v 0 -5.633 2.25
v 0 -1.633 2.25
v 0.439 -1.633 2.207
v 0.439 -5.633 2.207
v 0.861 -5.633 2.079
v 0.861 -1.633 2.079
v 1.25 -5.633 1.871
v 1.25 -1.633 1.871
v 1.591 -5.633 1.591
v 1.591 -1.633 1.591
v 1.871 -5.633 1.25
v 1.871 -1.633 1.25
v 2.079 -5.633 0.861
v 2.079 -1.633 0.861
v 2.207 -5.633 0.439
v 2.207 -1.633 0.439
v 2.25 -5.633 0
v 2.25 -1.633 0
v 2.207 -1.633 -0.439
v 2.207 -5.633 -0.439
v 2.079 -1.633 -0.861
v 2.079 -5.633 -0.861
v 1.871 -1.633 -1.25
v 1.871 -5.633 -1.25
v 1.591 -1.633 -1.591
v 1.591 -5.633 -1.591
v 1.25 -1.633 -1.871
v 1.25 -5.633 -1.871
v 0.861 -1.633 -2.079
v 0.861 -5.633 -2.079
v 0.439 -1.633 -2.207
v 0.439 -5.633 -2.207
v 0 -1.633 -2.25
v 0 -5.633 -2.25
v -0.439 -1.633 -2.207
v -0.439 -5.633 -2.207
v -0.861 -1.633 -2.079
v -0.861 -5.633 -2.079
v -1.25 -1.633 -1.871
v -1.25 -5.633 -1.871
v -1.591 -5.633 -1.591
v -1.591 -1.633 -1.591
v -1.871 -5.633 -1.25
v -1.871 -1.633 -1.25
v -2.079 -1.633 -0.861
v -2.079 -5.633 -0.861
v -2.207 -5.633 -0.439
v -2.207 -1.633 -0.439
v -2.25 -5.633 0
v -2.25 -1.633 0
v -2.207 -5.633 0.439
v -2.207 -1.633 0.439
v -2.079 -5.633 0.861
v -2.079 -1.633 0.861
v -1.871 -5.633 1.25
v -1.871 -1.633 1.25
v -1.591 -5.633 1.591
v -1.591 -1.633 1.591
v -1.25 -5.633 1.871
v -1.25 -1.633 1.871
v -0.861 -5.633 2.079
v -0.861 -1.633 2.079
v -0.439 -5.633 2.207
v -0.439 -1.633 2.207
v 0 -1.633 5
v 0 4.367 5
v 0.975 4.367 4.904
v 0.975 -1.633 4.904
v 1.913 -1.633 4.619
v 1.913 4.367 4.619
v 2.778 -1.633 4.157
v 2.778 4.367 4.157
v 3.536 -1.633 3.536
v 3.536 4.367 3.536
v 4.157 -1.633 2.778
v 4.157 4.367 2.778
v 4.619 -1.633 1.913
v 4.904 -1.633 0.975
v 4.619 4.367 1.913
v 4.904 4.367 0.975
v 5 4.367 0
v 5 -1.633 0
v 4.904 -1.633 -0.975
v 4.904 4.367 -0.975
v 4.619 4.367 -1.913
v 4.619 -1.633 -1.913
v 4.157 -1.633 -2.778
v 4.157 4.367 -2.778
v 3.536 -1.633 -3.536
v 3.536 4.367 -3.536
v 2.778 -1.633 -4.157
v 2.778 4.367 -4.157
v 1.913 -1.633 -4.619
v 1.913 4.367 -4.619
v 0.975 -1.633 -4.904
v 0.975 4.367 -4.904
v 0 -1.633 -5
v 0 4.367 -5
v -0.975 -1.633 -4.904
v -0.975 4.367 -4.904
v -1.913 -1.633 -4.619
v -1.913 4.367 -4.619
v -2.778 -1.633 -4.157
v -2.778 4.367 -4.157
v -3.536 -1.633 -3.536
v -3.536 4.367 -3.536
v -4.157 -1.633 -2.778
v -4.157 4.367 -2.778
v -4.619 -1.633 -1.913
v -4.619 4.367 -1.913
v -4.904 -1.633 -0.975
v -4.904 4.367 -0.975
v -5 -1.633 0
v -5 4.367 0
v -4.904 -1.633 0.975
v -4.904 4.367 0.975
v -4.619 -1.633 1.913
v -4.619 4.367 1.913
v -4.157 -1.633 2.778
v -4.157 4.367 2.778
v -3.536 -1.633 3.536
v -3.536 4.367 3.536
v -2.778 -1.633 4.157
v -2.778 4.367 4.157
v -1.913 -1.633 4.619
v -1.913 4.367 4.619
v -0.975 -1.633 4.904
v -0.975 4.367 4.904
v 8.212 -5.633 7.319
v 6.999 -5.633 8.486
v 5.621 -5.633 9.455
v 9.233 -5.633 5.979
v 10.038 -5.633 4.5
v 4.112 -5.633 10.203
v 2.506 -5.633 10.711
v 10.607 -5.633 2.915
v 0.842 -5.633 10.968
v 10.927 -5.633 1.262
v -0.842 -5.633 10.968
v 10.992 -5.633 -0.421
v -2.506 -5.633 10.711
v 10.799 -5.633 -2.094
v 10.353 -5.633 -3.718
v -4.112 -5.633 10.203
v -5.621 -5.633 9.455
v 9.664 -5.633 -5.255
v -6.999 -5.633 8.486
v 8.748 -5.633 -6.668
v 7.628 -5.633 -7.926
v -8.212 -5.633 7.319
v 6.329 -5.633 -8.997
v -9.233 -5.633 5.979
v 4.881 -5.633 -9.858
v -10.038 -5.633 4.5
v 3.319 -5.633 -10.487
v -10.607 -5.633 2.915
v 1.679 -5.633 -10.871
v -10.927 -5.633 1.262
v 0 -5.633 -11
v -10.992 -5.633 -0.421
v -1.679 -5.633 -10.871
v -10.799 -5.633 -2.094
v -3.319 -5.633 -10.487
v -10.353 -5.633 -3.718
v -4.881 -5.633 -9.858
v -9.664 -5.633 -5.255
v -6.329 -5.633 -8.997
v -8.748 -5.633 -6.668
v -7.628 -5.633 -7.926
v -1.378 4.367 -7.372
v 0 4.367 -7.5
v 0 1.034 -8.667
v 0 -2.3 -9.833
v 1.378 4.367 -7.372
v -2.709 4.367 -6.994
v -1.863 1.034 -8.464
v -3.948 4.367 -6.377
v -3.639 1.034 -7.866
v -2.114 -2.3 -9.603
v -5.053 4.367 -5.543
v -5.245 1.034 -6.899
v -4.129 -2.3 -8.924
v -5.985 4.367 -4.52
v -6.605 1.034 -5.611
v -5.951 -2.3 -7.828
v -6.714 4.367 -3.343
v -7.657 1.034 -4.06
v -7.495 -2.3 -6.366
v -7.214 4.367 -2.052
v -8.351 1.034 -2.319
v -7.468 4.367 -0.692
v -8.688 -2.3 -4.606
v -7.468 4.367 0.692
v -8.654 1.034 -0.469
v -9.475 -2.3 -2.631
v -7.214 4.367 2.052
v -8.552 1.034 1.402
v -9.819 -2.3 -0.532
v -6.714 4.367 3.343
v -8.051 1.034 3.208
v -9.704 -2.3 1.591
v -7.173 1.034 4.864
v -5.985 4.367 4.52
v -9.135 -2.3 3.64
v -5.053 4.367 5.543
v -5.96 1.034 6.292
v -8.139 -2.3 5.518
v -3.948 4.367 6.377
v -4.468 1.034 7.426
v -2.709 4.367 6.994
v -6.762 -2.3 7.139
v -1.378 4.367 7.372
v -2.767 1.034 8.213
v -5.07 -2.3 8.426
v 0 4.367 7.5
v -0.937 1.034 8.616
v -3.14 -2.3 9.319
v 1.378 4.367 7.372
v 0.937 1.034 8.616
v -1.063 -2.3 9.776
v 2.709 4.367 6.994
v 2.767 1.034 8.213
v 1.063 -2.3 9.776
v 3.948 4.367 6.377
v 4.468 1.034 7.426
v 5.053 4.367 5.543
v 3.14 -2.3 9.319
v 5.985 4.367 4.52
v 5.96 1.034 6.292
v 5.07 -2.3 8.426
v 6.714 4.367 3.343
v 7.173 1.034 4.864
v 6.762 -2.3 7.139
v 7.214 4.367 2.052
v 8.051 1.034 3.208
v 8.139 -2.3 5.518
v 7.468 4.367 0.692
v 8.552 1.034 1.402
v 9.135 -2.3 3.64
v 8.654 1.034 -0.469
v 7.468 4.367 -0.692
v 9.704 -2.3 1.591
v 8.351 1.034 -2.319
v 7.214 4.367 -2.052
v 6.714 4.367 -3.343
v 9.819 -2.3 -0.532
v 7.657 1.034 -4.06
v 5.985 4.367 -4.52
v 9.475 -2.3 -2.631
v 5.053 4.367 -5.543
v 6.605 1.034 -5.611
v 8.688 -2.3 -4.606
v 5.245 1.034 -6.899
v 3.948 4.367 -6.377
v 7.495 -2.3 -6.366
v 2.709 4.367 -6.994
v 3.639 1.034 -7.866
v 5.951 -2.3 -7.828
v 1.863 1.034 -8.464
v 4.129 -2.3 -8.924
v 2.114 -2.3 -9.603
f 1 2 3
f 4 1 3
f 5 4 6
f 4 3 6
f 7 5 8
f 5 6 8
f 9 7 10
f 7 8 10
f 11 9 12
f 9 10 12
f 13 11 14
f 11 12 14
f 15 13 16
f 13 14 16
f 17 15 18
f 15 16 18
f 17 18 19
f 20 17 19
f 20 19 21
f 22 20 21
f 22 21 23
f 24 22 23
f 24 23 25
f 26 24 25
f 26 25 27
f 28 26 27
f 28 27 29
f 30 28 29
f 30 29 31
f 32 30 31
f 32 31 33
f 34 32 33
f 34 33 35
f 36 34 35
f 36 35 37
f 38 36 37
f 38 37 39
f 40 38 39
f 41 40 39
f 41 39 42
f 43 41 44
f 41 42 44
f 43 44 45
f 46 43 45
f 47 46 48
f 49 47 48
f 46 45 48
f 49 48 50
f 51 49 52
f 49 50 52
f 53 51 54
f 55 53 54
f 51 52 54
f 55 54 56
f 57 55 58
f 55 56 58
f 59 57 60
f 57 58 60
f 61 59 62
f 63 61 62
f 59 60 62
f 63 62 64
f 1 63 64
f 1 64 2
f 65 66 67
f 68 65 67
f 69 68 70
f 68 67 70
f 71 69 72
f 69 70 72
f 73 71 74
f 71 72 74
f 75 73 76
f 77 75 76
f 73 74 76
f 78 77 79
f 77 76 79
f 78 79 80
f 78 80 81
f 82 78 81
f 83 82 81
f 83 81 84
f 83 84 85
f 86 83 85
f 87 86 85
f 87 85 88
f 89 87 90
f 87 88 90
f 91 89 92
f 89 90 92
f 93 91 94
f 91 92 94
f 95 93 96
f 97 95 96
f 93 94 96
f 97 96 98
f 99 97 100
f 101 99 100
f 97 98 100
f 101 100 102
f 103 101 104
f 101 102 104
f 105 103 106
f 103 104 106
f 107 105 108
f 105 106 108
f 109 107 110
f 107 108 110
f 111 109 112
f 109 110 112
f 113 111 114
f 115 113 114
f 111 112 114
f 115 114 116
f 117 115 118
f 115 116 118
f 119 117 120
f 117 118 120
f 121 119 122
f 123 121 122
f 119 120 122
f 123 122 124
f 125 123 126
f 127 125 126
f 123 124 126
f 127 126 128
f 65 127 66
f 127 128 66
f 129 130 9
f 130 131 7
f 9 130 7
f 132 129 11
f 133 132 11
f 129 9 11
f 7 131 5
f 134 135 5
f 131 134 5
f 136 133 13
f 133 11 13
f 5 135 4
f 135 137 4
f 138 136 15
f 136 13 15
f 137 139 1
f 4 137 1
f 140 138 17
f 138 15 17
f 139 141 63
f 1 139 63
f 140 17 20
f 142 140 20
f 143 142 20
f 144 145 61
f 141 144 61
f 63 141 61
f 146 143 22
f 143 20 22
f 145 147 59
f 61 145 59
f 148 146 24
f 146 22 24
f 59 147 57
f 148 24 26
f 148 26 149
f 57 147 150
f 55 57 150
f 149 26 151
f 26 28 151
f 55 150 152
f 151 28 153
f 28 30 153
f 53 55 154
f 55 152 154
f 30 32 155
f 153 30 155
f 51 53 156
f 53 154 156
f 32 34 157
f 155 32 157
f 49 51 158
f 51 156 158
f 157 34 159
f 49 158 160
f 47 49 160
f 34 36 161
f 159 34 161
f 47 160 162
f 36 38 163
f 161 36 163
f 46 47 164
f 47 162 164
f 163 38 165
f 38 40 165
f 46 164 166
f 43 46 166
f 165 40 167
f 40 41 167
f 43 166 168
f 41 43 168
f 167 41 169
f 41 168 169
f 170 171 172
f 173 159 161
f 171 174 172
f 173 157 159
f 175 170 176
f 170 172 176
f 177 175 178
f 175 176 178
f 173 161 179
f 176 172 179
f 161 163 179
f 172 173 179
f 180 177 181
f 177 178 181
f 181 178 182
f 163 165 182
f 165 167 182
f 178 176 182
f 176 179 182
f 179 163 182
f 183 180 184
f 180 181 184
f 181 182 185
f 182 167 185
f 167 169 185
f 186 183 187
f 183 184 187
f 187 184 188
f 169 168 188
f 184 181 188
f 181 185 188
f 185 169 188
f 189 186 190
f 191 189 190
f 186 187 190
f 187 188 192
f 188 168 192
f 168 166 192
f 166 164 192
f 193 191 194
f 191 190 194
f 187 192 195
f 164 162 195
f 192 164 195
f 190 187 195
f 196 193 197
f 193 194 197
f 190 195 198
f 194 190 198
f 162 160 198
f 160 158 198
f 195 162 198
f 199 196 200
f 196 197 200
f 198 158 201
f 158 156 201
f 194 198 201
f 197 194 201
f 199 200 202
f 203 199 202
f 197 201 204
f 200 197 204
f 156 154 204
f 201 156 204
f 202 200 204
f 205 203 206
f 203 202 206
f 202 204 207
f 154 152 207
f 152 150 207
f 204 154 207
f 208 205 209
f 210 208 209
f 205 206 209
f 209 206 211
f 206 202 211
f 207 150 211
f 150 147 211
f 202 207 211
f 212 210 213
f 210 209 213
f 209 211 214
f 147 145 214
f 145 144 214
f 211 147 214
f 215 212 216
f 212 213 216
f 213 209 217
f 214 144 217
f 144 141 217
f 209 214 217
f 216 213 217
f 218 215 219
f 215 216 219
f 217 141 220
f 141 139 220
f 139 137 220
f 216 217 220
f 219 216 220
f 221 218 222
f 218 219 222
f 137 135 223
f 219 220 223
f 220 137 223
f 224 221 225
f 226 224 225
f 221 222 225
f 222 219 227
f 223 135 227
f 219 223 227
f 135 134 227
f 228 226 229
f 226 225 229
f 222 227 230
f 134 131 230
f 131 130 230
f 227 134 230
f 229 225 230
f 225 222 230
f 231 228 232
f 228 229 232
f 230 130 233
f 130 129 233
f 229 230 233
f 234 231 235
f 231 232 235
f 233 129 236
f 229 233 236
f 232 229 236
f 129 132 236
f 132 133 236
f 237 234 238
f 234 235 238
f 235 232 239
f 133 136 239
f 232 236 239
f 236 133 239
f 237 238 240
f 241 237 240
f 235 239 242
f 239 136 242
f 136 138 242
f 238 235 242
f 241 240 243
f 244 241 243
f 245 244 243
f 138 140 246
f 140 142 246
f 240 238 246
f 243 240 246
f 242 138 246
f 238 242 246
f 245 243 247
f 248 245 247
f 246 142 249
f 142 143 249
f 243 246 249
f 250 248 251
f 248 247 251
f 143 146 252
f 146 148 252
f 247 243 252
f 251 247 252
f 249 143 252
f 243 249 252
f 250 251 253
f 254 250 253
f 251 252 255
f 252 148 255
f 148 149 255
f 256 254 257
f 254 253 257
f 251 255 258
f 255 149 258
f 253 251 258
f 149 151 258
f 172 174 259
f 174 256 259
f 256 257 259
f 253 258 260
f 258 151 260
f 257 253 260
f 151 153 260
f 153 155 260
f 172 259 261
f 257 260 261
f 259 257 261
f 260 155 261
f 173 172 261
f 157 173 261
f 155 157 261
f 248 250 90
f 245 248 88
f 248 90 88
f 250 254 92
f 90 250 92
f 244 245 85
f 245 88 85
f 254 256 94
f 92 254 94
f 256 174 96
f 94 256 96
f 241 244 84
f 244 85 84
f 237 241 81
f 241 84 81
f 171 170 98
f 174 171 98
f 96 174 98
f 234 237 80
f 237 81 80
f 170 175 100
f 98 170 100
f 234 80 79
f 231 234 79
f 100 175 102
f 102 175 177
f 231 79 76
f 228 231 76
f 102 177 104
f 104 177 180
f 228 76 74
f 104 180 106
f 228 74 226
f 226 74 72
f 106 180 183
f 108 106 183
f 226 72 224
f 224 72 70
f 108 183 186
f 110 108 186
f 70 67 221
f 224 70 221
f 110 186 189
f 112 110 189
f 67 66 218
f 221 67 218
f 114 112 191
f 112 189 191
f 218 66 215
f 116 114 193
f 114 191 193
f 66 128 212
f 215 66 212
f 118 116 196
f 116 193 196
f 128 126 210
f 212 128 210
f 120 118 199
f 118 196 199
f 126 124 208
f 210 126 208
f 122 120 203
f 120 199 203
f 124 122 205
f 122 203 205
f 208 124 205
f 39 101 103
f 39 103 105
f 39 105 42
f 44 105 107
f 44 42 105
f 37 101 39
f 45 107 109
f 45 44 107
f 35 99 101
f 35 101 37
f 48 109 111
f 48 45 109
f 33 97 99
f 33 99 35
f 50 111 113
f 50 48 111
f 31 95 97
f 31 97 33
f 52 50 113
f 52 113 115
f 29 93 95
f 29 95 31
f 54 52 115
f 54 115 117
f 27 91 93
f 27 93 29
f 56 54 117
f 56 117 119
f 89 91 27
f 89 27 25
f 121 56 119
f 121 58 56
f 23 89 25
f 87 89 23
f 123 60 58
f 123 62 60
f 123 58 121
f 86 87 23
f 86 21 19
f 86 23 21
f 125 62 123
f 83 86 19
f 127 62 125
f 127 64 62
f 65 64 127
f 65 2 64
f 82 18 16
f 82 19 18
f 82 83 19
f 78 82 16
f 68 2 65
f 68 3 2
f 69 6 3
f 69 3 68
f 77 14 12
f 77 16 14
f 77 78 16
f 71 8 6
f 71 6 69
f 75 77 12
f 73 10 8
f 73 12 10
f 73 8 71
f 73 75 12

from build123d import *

# Parameters (mm, degrees)
SKETCH_3_R          = 2.25
CUT_EXTRUDE_1_DEPTH = 10
SKETCH_4_R          = 5
CUT_EXTRUDE_2_DEPTH = 6


with BuildPart() as part:
    # Эскиз2 → Повернуть1 (revolve)
    with BuildSketch(Plane.XY, mode=Mode.PRIVATE) as revolve_1_sk:
        Polygon((0, 4.367021277), (-7.5, 4.367021277), (-11, -5.632978723), (0, -5.632978723), align=None)
    revolve(revolve_1_sk.sketch.rotate(Axis((0, -5.632978723, 0), (0, 1, 0)), 270), axis=Axis((0, -5.632978723, 0), (0, 1, 0)))

    # Эскиз3 → Вырез-Вытянуть1 (cut)
    with BuildSketch(Plane(origin=(0, 4.367021277, 0), x_dir=(1, 0, 0), z_dir=(0, 1, 0))):
        with Locations(Location((0, 0, 0), (0, 0, 270))):
            Circle(SKETCH_3_R)
    extrude(amount=-CUT_EXTRUDE_1_DEPTH, mode=Mode.SUBTRACT)

    # Эскиз4 → Вырез-Вытянуть2 (cut)
    with BuildSketch(Plane(origin=(0, 4.367021277, 0), x_dir=(1, 0, 0), z_dir=(0, 1, 0))):
        with Locations(Location((0, 0, 0), (0, 0, 270))):
            Circle(SKETCH_4_R)
    extrude(amount=-CUT_EXTRUDE_2_DEPTH, mode=Mode.SUBTRACT)


solid = part.part
